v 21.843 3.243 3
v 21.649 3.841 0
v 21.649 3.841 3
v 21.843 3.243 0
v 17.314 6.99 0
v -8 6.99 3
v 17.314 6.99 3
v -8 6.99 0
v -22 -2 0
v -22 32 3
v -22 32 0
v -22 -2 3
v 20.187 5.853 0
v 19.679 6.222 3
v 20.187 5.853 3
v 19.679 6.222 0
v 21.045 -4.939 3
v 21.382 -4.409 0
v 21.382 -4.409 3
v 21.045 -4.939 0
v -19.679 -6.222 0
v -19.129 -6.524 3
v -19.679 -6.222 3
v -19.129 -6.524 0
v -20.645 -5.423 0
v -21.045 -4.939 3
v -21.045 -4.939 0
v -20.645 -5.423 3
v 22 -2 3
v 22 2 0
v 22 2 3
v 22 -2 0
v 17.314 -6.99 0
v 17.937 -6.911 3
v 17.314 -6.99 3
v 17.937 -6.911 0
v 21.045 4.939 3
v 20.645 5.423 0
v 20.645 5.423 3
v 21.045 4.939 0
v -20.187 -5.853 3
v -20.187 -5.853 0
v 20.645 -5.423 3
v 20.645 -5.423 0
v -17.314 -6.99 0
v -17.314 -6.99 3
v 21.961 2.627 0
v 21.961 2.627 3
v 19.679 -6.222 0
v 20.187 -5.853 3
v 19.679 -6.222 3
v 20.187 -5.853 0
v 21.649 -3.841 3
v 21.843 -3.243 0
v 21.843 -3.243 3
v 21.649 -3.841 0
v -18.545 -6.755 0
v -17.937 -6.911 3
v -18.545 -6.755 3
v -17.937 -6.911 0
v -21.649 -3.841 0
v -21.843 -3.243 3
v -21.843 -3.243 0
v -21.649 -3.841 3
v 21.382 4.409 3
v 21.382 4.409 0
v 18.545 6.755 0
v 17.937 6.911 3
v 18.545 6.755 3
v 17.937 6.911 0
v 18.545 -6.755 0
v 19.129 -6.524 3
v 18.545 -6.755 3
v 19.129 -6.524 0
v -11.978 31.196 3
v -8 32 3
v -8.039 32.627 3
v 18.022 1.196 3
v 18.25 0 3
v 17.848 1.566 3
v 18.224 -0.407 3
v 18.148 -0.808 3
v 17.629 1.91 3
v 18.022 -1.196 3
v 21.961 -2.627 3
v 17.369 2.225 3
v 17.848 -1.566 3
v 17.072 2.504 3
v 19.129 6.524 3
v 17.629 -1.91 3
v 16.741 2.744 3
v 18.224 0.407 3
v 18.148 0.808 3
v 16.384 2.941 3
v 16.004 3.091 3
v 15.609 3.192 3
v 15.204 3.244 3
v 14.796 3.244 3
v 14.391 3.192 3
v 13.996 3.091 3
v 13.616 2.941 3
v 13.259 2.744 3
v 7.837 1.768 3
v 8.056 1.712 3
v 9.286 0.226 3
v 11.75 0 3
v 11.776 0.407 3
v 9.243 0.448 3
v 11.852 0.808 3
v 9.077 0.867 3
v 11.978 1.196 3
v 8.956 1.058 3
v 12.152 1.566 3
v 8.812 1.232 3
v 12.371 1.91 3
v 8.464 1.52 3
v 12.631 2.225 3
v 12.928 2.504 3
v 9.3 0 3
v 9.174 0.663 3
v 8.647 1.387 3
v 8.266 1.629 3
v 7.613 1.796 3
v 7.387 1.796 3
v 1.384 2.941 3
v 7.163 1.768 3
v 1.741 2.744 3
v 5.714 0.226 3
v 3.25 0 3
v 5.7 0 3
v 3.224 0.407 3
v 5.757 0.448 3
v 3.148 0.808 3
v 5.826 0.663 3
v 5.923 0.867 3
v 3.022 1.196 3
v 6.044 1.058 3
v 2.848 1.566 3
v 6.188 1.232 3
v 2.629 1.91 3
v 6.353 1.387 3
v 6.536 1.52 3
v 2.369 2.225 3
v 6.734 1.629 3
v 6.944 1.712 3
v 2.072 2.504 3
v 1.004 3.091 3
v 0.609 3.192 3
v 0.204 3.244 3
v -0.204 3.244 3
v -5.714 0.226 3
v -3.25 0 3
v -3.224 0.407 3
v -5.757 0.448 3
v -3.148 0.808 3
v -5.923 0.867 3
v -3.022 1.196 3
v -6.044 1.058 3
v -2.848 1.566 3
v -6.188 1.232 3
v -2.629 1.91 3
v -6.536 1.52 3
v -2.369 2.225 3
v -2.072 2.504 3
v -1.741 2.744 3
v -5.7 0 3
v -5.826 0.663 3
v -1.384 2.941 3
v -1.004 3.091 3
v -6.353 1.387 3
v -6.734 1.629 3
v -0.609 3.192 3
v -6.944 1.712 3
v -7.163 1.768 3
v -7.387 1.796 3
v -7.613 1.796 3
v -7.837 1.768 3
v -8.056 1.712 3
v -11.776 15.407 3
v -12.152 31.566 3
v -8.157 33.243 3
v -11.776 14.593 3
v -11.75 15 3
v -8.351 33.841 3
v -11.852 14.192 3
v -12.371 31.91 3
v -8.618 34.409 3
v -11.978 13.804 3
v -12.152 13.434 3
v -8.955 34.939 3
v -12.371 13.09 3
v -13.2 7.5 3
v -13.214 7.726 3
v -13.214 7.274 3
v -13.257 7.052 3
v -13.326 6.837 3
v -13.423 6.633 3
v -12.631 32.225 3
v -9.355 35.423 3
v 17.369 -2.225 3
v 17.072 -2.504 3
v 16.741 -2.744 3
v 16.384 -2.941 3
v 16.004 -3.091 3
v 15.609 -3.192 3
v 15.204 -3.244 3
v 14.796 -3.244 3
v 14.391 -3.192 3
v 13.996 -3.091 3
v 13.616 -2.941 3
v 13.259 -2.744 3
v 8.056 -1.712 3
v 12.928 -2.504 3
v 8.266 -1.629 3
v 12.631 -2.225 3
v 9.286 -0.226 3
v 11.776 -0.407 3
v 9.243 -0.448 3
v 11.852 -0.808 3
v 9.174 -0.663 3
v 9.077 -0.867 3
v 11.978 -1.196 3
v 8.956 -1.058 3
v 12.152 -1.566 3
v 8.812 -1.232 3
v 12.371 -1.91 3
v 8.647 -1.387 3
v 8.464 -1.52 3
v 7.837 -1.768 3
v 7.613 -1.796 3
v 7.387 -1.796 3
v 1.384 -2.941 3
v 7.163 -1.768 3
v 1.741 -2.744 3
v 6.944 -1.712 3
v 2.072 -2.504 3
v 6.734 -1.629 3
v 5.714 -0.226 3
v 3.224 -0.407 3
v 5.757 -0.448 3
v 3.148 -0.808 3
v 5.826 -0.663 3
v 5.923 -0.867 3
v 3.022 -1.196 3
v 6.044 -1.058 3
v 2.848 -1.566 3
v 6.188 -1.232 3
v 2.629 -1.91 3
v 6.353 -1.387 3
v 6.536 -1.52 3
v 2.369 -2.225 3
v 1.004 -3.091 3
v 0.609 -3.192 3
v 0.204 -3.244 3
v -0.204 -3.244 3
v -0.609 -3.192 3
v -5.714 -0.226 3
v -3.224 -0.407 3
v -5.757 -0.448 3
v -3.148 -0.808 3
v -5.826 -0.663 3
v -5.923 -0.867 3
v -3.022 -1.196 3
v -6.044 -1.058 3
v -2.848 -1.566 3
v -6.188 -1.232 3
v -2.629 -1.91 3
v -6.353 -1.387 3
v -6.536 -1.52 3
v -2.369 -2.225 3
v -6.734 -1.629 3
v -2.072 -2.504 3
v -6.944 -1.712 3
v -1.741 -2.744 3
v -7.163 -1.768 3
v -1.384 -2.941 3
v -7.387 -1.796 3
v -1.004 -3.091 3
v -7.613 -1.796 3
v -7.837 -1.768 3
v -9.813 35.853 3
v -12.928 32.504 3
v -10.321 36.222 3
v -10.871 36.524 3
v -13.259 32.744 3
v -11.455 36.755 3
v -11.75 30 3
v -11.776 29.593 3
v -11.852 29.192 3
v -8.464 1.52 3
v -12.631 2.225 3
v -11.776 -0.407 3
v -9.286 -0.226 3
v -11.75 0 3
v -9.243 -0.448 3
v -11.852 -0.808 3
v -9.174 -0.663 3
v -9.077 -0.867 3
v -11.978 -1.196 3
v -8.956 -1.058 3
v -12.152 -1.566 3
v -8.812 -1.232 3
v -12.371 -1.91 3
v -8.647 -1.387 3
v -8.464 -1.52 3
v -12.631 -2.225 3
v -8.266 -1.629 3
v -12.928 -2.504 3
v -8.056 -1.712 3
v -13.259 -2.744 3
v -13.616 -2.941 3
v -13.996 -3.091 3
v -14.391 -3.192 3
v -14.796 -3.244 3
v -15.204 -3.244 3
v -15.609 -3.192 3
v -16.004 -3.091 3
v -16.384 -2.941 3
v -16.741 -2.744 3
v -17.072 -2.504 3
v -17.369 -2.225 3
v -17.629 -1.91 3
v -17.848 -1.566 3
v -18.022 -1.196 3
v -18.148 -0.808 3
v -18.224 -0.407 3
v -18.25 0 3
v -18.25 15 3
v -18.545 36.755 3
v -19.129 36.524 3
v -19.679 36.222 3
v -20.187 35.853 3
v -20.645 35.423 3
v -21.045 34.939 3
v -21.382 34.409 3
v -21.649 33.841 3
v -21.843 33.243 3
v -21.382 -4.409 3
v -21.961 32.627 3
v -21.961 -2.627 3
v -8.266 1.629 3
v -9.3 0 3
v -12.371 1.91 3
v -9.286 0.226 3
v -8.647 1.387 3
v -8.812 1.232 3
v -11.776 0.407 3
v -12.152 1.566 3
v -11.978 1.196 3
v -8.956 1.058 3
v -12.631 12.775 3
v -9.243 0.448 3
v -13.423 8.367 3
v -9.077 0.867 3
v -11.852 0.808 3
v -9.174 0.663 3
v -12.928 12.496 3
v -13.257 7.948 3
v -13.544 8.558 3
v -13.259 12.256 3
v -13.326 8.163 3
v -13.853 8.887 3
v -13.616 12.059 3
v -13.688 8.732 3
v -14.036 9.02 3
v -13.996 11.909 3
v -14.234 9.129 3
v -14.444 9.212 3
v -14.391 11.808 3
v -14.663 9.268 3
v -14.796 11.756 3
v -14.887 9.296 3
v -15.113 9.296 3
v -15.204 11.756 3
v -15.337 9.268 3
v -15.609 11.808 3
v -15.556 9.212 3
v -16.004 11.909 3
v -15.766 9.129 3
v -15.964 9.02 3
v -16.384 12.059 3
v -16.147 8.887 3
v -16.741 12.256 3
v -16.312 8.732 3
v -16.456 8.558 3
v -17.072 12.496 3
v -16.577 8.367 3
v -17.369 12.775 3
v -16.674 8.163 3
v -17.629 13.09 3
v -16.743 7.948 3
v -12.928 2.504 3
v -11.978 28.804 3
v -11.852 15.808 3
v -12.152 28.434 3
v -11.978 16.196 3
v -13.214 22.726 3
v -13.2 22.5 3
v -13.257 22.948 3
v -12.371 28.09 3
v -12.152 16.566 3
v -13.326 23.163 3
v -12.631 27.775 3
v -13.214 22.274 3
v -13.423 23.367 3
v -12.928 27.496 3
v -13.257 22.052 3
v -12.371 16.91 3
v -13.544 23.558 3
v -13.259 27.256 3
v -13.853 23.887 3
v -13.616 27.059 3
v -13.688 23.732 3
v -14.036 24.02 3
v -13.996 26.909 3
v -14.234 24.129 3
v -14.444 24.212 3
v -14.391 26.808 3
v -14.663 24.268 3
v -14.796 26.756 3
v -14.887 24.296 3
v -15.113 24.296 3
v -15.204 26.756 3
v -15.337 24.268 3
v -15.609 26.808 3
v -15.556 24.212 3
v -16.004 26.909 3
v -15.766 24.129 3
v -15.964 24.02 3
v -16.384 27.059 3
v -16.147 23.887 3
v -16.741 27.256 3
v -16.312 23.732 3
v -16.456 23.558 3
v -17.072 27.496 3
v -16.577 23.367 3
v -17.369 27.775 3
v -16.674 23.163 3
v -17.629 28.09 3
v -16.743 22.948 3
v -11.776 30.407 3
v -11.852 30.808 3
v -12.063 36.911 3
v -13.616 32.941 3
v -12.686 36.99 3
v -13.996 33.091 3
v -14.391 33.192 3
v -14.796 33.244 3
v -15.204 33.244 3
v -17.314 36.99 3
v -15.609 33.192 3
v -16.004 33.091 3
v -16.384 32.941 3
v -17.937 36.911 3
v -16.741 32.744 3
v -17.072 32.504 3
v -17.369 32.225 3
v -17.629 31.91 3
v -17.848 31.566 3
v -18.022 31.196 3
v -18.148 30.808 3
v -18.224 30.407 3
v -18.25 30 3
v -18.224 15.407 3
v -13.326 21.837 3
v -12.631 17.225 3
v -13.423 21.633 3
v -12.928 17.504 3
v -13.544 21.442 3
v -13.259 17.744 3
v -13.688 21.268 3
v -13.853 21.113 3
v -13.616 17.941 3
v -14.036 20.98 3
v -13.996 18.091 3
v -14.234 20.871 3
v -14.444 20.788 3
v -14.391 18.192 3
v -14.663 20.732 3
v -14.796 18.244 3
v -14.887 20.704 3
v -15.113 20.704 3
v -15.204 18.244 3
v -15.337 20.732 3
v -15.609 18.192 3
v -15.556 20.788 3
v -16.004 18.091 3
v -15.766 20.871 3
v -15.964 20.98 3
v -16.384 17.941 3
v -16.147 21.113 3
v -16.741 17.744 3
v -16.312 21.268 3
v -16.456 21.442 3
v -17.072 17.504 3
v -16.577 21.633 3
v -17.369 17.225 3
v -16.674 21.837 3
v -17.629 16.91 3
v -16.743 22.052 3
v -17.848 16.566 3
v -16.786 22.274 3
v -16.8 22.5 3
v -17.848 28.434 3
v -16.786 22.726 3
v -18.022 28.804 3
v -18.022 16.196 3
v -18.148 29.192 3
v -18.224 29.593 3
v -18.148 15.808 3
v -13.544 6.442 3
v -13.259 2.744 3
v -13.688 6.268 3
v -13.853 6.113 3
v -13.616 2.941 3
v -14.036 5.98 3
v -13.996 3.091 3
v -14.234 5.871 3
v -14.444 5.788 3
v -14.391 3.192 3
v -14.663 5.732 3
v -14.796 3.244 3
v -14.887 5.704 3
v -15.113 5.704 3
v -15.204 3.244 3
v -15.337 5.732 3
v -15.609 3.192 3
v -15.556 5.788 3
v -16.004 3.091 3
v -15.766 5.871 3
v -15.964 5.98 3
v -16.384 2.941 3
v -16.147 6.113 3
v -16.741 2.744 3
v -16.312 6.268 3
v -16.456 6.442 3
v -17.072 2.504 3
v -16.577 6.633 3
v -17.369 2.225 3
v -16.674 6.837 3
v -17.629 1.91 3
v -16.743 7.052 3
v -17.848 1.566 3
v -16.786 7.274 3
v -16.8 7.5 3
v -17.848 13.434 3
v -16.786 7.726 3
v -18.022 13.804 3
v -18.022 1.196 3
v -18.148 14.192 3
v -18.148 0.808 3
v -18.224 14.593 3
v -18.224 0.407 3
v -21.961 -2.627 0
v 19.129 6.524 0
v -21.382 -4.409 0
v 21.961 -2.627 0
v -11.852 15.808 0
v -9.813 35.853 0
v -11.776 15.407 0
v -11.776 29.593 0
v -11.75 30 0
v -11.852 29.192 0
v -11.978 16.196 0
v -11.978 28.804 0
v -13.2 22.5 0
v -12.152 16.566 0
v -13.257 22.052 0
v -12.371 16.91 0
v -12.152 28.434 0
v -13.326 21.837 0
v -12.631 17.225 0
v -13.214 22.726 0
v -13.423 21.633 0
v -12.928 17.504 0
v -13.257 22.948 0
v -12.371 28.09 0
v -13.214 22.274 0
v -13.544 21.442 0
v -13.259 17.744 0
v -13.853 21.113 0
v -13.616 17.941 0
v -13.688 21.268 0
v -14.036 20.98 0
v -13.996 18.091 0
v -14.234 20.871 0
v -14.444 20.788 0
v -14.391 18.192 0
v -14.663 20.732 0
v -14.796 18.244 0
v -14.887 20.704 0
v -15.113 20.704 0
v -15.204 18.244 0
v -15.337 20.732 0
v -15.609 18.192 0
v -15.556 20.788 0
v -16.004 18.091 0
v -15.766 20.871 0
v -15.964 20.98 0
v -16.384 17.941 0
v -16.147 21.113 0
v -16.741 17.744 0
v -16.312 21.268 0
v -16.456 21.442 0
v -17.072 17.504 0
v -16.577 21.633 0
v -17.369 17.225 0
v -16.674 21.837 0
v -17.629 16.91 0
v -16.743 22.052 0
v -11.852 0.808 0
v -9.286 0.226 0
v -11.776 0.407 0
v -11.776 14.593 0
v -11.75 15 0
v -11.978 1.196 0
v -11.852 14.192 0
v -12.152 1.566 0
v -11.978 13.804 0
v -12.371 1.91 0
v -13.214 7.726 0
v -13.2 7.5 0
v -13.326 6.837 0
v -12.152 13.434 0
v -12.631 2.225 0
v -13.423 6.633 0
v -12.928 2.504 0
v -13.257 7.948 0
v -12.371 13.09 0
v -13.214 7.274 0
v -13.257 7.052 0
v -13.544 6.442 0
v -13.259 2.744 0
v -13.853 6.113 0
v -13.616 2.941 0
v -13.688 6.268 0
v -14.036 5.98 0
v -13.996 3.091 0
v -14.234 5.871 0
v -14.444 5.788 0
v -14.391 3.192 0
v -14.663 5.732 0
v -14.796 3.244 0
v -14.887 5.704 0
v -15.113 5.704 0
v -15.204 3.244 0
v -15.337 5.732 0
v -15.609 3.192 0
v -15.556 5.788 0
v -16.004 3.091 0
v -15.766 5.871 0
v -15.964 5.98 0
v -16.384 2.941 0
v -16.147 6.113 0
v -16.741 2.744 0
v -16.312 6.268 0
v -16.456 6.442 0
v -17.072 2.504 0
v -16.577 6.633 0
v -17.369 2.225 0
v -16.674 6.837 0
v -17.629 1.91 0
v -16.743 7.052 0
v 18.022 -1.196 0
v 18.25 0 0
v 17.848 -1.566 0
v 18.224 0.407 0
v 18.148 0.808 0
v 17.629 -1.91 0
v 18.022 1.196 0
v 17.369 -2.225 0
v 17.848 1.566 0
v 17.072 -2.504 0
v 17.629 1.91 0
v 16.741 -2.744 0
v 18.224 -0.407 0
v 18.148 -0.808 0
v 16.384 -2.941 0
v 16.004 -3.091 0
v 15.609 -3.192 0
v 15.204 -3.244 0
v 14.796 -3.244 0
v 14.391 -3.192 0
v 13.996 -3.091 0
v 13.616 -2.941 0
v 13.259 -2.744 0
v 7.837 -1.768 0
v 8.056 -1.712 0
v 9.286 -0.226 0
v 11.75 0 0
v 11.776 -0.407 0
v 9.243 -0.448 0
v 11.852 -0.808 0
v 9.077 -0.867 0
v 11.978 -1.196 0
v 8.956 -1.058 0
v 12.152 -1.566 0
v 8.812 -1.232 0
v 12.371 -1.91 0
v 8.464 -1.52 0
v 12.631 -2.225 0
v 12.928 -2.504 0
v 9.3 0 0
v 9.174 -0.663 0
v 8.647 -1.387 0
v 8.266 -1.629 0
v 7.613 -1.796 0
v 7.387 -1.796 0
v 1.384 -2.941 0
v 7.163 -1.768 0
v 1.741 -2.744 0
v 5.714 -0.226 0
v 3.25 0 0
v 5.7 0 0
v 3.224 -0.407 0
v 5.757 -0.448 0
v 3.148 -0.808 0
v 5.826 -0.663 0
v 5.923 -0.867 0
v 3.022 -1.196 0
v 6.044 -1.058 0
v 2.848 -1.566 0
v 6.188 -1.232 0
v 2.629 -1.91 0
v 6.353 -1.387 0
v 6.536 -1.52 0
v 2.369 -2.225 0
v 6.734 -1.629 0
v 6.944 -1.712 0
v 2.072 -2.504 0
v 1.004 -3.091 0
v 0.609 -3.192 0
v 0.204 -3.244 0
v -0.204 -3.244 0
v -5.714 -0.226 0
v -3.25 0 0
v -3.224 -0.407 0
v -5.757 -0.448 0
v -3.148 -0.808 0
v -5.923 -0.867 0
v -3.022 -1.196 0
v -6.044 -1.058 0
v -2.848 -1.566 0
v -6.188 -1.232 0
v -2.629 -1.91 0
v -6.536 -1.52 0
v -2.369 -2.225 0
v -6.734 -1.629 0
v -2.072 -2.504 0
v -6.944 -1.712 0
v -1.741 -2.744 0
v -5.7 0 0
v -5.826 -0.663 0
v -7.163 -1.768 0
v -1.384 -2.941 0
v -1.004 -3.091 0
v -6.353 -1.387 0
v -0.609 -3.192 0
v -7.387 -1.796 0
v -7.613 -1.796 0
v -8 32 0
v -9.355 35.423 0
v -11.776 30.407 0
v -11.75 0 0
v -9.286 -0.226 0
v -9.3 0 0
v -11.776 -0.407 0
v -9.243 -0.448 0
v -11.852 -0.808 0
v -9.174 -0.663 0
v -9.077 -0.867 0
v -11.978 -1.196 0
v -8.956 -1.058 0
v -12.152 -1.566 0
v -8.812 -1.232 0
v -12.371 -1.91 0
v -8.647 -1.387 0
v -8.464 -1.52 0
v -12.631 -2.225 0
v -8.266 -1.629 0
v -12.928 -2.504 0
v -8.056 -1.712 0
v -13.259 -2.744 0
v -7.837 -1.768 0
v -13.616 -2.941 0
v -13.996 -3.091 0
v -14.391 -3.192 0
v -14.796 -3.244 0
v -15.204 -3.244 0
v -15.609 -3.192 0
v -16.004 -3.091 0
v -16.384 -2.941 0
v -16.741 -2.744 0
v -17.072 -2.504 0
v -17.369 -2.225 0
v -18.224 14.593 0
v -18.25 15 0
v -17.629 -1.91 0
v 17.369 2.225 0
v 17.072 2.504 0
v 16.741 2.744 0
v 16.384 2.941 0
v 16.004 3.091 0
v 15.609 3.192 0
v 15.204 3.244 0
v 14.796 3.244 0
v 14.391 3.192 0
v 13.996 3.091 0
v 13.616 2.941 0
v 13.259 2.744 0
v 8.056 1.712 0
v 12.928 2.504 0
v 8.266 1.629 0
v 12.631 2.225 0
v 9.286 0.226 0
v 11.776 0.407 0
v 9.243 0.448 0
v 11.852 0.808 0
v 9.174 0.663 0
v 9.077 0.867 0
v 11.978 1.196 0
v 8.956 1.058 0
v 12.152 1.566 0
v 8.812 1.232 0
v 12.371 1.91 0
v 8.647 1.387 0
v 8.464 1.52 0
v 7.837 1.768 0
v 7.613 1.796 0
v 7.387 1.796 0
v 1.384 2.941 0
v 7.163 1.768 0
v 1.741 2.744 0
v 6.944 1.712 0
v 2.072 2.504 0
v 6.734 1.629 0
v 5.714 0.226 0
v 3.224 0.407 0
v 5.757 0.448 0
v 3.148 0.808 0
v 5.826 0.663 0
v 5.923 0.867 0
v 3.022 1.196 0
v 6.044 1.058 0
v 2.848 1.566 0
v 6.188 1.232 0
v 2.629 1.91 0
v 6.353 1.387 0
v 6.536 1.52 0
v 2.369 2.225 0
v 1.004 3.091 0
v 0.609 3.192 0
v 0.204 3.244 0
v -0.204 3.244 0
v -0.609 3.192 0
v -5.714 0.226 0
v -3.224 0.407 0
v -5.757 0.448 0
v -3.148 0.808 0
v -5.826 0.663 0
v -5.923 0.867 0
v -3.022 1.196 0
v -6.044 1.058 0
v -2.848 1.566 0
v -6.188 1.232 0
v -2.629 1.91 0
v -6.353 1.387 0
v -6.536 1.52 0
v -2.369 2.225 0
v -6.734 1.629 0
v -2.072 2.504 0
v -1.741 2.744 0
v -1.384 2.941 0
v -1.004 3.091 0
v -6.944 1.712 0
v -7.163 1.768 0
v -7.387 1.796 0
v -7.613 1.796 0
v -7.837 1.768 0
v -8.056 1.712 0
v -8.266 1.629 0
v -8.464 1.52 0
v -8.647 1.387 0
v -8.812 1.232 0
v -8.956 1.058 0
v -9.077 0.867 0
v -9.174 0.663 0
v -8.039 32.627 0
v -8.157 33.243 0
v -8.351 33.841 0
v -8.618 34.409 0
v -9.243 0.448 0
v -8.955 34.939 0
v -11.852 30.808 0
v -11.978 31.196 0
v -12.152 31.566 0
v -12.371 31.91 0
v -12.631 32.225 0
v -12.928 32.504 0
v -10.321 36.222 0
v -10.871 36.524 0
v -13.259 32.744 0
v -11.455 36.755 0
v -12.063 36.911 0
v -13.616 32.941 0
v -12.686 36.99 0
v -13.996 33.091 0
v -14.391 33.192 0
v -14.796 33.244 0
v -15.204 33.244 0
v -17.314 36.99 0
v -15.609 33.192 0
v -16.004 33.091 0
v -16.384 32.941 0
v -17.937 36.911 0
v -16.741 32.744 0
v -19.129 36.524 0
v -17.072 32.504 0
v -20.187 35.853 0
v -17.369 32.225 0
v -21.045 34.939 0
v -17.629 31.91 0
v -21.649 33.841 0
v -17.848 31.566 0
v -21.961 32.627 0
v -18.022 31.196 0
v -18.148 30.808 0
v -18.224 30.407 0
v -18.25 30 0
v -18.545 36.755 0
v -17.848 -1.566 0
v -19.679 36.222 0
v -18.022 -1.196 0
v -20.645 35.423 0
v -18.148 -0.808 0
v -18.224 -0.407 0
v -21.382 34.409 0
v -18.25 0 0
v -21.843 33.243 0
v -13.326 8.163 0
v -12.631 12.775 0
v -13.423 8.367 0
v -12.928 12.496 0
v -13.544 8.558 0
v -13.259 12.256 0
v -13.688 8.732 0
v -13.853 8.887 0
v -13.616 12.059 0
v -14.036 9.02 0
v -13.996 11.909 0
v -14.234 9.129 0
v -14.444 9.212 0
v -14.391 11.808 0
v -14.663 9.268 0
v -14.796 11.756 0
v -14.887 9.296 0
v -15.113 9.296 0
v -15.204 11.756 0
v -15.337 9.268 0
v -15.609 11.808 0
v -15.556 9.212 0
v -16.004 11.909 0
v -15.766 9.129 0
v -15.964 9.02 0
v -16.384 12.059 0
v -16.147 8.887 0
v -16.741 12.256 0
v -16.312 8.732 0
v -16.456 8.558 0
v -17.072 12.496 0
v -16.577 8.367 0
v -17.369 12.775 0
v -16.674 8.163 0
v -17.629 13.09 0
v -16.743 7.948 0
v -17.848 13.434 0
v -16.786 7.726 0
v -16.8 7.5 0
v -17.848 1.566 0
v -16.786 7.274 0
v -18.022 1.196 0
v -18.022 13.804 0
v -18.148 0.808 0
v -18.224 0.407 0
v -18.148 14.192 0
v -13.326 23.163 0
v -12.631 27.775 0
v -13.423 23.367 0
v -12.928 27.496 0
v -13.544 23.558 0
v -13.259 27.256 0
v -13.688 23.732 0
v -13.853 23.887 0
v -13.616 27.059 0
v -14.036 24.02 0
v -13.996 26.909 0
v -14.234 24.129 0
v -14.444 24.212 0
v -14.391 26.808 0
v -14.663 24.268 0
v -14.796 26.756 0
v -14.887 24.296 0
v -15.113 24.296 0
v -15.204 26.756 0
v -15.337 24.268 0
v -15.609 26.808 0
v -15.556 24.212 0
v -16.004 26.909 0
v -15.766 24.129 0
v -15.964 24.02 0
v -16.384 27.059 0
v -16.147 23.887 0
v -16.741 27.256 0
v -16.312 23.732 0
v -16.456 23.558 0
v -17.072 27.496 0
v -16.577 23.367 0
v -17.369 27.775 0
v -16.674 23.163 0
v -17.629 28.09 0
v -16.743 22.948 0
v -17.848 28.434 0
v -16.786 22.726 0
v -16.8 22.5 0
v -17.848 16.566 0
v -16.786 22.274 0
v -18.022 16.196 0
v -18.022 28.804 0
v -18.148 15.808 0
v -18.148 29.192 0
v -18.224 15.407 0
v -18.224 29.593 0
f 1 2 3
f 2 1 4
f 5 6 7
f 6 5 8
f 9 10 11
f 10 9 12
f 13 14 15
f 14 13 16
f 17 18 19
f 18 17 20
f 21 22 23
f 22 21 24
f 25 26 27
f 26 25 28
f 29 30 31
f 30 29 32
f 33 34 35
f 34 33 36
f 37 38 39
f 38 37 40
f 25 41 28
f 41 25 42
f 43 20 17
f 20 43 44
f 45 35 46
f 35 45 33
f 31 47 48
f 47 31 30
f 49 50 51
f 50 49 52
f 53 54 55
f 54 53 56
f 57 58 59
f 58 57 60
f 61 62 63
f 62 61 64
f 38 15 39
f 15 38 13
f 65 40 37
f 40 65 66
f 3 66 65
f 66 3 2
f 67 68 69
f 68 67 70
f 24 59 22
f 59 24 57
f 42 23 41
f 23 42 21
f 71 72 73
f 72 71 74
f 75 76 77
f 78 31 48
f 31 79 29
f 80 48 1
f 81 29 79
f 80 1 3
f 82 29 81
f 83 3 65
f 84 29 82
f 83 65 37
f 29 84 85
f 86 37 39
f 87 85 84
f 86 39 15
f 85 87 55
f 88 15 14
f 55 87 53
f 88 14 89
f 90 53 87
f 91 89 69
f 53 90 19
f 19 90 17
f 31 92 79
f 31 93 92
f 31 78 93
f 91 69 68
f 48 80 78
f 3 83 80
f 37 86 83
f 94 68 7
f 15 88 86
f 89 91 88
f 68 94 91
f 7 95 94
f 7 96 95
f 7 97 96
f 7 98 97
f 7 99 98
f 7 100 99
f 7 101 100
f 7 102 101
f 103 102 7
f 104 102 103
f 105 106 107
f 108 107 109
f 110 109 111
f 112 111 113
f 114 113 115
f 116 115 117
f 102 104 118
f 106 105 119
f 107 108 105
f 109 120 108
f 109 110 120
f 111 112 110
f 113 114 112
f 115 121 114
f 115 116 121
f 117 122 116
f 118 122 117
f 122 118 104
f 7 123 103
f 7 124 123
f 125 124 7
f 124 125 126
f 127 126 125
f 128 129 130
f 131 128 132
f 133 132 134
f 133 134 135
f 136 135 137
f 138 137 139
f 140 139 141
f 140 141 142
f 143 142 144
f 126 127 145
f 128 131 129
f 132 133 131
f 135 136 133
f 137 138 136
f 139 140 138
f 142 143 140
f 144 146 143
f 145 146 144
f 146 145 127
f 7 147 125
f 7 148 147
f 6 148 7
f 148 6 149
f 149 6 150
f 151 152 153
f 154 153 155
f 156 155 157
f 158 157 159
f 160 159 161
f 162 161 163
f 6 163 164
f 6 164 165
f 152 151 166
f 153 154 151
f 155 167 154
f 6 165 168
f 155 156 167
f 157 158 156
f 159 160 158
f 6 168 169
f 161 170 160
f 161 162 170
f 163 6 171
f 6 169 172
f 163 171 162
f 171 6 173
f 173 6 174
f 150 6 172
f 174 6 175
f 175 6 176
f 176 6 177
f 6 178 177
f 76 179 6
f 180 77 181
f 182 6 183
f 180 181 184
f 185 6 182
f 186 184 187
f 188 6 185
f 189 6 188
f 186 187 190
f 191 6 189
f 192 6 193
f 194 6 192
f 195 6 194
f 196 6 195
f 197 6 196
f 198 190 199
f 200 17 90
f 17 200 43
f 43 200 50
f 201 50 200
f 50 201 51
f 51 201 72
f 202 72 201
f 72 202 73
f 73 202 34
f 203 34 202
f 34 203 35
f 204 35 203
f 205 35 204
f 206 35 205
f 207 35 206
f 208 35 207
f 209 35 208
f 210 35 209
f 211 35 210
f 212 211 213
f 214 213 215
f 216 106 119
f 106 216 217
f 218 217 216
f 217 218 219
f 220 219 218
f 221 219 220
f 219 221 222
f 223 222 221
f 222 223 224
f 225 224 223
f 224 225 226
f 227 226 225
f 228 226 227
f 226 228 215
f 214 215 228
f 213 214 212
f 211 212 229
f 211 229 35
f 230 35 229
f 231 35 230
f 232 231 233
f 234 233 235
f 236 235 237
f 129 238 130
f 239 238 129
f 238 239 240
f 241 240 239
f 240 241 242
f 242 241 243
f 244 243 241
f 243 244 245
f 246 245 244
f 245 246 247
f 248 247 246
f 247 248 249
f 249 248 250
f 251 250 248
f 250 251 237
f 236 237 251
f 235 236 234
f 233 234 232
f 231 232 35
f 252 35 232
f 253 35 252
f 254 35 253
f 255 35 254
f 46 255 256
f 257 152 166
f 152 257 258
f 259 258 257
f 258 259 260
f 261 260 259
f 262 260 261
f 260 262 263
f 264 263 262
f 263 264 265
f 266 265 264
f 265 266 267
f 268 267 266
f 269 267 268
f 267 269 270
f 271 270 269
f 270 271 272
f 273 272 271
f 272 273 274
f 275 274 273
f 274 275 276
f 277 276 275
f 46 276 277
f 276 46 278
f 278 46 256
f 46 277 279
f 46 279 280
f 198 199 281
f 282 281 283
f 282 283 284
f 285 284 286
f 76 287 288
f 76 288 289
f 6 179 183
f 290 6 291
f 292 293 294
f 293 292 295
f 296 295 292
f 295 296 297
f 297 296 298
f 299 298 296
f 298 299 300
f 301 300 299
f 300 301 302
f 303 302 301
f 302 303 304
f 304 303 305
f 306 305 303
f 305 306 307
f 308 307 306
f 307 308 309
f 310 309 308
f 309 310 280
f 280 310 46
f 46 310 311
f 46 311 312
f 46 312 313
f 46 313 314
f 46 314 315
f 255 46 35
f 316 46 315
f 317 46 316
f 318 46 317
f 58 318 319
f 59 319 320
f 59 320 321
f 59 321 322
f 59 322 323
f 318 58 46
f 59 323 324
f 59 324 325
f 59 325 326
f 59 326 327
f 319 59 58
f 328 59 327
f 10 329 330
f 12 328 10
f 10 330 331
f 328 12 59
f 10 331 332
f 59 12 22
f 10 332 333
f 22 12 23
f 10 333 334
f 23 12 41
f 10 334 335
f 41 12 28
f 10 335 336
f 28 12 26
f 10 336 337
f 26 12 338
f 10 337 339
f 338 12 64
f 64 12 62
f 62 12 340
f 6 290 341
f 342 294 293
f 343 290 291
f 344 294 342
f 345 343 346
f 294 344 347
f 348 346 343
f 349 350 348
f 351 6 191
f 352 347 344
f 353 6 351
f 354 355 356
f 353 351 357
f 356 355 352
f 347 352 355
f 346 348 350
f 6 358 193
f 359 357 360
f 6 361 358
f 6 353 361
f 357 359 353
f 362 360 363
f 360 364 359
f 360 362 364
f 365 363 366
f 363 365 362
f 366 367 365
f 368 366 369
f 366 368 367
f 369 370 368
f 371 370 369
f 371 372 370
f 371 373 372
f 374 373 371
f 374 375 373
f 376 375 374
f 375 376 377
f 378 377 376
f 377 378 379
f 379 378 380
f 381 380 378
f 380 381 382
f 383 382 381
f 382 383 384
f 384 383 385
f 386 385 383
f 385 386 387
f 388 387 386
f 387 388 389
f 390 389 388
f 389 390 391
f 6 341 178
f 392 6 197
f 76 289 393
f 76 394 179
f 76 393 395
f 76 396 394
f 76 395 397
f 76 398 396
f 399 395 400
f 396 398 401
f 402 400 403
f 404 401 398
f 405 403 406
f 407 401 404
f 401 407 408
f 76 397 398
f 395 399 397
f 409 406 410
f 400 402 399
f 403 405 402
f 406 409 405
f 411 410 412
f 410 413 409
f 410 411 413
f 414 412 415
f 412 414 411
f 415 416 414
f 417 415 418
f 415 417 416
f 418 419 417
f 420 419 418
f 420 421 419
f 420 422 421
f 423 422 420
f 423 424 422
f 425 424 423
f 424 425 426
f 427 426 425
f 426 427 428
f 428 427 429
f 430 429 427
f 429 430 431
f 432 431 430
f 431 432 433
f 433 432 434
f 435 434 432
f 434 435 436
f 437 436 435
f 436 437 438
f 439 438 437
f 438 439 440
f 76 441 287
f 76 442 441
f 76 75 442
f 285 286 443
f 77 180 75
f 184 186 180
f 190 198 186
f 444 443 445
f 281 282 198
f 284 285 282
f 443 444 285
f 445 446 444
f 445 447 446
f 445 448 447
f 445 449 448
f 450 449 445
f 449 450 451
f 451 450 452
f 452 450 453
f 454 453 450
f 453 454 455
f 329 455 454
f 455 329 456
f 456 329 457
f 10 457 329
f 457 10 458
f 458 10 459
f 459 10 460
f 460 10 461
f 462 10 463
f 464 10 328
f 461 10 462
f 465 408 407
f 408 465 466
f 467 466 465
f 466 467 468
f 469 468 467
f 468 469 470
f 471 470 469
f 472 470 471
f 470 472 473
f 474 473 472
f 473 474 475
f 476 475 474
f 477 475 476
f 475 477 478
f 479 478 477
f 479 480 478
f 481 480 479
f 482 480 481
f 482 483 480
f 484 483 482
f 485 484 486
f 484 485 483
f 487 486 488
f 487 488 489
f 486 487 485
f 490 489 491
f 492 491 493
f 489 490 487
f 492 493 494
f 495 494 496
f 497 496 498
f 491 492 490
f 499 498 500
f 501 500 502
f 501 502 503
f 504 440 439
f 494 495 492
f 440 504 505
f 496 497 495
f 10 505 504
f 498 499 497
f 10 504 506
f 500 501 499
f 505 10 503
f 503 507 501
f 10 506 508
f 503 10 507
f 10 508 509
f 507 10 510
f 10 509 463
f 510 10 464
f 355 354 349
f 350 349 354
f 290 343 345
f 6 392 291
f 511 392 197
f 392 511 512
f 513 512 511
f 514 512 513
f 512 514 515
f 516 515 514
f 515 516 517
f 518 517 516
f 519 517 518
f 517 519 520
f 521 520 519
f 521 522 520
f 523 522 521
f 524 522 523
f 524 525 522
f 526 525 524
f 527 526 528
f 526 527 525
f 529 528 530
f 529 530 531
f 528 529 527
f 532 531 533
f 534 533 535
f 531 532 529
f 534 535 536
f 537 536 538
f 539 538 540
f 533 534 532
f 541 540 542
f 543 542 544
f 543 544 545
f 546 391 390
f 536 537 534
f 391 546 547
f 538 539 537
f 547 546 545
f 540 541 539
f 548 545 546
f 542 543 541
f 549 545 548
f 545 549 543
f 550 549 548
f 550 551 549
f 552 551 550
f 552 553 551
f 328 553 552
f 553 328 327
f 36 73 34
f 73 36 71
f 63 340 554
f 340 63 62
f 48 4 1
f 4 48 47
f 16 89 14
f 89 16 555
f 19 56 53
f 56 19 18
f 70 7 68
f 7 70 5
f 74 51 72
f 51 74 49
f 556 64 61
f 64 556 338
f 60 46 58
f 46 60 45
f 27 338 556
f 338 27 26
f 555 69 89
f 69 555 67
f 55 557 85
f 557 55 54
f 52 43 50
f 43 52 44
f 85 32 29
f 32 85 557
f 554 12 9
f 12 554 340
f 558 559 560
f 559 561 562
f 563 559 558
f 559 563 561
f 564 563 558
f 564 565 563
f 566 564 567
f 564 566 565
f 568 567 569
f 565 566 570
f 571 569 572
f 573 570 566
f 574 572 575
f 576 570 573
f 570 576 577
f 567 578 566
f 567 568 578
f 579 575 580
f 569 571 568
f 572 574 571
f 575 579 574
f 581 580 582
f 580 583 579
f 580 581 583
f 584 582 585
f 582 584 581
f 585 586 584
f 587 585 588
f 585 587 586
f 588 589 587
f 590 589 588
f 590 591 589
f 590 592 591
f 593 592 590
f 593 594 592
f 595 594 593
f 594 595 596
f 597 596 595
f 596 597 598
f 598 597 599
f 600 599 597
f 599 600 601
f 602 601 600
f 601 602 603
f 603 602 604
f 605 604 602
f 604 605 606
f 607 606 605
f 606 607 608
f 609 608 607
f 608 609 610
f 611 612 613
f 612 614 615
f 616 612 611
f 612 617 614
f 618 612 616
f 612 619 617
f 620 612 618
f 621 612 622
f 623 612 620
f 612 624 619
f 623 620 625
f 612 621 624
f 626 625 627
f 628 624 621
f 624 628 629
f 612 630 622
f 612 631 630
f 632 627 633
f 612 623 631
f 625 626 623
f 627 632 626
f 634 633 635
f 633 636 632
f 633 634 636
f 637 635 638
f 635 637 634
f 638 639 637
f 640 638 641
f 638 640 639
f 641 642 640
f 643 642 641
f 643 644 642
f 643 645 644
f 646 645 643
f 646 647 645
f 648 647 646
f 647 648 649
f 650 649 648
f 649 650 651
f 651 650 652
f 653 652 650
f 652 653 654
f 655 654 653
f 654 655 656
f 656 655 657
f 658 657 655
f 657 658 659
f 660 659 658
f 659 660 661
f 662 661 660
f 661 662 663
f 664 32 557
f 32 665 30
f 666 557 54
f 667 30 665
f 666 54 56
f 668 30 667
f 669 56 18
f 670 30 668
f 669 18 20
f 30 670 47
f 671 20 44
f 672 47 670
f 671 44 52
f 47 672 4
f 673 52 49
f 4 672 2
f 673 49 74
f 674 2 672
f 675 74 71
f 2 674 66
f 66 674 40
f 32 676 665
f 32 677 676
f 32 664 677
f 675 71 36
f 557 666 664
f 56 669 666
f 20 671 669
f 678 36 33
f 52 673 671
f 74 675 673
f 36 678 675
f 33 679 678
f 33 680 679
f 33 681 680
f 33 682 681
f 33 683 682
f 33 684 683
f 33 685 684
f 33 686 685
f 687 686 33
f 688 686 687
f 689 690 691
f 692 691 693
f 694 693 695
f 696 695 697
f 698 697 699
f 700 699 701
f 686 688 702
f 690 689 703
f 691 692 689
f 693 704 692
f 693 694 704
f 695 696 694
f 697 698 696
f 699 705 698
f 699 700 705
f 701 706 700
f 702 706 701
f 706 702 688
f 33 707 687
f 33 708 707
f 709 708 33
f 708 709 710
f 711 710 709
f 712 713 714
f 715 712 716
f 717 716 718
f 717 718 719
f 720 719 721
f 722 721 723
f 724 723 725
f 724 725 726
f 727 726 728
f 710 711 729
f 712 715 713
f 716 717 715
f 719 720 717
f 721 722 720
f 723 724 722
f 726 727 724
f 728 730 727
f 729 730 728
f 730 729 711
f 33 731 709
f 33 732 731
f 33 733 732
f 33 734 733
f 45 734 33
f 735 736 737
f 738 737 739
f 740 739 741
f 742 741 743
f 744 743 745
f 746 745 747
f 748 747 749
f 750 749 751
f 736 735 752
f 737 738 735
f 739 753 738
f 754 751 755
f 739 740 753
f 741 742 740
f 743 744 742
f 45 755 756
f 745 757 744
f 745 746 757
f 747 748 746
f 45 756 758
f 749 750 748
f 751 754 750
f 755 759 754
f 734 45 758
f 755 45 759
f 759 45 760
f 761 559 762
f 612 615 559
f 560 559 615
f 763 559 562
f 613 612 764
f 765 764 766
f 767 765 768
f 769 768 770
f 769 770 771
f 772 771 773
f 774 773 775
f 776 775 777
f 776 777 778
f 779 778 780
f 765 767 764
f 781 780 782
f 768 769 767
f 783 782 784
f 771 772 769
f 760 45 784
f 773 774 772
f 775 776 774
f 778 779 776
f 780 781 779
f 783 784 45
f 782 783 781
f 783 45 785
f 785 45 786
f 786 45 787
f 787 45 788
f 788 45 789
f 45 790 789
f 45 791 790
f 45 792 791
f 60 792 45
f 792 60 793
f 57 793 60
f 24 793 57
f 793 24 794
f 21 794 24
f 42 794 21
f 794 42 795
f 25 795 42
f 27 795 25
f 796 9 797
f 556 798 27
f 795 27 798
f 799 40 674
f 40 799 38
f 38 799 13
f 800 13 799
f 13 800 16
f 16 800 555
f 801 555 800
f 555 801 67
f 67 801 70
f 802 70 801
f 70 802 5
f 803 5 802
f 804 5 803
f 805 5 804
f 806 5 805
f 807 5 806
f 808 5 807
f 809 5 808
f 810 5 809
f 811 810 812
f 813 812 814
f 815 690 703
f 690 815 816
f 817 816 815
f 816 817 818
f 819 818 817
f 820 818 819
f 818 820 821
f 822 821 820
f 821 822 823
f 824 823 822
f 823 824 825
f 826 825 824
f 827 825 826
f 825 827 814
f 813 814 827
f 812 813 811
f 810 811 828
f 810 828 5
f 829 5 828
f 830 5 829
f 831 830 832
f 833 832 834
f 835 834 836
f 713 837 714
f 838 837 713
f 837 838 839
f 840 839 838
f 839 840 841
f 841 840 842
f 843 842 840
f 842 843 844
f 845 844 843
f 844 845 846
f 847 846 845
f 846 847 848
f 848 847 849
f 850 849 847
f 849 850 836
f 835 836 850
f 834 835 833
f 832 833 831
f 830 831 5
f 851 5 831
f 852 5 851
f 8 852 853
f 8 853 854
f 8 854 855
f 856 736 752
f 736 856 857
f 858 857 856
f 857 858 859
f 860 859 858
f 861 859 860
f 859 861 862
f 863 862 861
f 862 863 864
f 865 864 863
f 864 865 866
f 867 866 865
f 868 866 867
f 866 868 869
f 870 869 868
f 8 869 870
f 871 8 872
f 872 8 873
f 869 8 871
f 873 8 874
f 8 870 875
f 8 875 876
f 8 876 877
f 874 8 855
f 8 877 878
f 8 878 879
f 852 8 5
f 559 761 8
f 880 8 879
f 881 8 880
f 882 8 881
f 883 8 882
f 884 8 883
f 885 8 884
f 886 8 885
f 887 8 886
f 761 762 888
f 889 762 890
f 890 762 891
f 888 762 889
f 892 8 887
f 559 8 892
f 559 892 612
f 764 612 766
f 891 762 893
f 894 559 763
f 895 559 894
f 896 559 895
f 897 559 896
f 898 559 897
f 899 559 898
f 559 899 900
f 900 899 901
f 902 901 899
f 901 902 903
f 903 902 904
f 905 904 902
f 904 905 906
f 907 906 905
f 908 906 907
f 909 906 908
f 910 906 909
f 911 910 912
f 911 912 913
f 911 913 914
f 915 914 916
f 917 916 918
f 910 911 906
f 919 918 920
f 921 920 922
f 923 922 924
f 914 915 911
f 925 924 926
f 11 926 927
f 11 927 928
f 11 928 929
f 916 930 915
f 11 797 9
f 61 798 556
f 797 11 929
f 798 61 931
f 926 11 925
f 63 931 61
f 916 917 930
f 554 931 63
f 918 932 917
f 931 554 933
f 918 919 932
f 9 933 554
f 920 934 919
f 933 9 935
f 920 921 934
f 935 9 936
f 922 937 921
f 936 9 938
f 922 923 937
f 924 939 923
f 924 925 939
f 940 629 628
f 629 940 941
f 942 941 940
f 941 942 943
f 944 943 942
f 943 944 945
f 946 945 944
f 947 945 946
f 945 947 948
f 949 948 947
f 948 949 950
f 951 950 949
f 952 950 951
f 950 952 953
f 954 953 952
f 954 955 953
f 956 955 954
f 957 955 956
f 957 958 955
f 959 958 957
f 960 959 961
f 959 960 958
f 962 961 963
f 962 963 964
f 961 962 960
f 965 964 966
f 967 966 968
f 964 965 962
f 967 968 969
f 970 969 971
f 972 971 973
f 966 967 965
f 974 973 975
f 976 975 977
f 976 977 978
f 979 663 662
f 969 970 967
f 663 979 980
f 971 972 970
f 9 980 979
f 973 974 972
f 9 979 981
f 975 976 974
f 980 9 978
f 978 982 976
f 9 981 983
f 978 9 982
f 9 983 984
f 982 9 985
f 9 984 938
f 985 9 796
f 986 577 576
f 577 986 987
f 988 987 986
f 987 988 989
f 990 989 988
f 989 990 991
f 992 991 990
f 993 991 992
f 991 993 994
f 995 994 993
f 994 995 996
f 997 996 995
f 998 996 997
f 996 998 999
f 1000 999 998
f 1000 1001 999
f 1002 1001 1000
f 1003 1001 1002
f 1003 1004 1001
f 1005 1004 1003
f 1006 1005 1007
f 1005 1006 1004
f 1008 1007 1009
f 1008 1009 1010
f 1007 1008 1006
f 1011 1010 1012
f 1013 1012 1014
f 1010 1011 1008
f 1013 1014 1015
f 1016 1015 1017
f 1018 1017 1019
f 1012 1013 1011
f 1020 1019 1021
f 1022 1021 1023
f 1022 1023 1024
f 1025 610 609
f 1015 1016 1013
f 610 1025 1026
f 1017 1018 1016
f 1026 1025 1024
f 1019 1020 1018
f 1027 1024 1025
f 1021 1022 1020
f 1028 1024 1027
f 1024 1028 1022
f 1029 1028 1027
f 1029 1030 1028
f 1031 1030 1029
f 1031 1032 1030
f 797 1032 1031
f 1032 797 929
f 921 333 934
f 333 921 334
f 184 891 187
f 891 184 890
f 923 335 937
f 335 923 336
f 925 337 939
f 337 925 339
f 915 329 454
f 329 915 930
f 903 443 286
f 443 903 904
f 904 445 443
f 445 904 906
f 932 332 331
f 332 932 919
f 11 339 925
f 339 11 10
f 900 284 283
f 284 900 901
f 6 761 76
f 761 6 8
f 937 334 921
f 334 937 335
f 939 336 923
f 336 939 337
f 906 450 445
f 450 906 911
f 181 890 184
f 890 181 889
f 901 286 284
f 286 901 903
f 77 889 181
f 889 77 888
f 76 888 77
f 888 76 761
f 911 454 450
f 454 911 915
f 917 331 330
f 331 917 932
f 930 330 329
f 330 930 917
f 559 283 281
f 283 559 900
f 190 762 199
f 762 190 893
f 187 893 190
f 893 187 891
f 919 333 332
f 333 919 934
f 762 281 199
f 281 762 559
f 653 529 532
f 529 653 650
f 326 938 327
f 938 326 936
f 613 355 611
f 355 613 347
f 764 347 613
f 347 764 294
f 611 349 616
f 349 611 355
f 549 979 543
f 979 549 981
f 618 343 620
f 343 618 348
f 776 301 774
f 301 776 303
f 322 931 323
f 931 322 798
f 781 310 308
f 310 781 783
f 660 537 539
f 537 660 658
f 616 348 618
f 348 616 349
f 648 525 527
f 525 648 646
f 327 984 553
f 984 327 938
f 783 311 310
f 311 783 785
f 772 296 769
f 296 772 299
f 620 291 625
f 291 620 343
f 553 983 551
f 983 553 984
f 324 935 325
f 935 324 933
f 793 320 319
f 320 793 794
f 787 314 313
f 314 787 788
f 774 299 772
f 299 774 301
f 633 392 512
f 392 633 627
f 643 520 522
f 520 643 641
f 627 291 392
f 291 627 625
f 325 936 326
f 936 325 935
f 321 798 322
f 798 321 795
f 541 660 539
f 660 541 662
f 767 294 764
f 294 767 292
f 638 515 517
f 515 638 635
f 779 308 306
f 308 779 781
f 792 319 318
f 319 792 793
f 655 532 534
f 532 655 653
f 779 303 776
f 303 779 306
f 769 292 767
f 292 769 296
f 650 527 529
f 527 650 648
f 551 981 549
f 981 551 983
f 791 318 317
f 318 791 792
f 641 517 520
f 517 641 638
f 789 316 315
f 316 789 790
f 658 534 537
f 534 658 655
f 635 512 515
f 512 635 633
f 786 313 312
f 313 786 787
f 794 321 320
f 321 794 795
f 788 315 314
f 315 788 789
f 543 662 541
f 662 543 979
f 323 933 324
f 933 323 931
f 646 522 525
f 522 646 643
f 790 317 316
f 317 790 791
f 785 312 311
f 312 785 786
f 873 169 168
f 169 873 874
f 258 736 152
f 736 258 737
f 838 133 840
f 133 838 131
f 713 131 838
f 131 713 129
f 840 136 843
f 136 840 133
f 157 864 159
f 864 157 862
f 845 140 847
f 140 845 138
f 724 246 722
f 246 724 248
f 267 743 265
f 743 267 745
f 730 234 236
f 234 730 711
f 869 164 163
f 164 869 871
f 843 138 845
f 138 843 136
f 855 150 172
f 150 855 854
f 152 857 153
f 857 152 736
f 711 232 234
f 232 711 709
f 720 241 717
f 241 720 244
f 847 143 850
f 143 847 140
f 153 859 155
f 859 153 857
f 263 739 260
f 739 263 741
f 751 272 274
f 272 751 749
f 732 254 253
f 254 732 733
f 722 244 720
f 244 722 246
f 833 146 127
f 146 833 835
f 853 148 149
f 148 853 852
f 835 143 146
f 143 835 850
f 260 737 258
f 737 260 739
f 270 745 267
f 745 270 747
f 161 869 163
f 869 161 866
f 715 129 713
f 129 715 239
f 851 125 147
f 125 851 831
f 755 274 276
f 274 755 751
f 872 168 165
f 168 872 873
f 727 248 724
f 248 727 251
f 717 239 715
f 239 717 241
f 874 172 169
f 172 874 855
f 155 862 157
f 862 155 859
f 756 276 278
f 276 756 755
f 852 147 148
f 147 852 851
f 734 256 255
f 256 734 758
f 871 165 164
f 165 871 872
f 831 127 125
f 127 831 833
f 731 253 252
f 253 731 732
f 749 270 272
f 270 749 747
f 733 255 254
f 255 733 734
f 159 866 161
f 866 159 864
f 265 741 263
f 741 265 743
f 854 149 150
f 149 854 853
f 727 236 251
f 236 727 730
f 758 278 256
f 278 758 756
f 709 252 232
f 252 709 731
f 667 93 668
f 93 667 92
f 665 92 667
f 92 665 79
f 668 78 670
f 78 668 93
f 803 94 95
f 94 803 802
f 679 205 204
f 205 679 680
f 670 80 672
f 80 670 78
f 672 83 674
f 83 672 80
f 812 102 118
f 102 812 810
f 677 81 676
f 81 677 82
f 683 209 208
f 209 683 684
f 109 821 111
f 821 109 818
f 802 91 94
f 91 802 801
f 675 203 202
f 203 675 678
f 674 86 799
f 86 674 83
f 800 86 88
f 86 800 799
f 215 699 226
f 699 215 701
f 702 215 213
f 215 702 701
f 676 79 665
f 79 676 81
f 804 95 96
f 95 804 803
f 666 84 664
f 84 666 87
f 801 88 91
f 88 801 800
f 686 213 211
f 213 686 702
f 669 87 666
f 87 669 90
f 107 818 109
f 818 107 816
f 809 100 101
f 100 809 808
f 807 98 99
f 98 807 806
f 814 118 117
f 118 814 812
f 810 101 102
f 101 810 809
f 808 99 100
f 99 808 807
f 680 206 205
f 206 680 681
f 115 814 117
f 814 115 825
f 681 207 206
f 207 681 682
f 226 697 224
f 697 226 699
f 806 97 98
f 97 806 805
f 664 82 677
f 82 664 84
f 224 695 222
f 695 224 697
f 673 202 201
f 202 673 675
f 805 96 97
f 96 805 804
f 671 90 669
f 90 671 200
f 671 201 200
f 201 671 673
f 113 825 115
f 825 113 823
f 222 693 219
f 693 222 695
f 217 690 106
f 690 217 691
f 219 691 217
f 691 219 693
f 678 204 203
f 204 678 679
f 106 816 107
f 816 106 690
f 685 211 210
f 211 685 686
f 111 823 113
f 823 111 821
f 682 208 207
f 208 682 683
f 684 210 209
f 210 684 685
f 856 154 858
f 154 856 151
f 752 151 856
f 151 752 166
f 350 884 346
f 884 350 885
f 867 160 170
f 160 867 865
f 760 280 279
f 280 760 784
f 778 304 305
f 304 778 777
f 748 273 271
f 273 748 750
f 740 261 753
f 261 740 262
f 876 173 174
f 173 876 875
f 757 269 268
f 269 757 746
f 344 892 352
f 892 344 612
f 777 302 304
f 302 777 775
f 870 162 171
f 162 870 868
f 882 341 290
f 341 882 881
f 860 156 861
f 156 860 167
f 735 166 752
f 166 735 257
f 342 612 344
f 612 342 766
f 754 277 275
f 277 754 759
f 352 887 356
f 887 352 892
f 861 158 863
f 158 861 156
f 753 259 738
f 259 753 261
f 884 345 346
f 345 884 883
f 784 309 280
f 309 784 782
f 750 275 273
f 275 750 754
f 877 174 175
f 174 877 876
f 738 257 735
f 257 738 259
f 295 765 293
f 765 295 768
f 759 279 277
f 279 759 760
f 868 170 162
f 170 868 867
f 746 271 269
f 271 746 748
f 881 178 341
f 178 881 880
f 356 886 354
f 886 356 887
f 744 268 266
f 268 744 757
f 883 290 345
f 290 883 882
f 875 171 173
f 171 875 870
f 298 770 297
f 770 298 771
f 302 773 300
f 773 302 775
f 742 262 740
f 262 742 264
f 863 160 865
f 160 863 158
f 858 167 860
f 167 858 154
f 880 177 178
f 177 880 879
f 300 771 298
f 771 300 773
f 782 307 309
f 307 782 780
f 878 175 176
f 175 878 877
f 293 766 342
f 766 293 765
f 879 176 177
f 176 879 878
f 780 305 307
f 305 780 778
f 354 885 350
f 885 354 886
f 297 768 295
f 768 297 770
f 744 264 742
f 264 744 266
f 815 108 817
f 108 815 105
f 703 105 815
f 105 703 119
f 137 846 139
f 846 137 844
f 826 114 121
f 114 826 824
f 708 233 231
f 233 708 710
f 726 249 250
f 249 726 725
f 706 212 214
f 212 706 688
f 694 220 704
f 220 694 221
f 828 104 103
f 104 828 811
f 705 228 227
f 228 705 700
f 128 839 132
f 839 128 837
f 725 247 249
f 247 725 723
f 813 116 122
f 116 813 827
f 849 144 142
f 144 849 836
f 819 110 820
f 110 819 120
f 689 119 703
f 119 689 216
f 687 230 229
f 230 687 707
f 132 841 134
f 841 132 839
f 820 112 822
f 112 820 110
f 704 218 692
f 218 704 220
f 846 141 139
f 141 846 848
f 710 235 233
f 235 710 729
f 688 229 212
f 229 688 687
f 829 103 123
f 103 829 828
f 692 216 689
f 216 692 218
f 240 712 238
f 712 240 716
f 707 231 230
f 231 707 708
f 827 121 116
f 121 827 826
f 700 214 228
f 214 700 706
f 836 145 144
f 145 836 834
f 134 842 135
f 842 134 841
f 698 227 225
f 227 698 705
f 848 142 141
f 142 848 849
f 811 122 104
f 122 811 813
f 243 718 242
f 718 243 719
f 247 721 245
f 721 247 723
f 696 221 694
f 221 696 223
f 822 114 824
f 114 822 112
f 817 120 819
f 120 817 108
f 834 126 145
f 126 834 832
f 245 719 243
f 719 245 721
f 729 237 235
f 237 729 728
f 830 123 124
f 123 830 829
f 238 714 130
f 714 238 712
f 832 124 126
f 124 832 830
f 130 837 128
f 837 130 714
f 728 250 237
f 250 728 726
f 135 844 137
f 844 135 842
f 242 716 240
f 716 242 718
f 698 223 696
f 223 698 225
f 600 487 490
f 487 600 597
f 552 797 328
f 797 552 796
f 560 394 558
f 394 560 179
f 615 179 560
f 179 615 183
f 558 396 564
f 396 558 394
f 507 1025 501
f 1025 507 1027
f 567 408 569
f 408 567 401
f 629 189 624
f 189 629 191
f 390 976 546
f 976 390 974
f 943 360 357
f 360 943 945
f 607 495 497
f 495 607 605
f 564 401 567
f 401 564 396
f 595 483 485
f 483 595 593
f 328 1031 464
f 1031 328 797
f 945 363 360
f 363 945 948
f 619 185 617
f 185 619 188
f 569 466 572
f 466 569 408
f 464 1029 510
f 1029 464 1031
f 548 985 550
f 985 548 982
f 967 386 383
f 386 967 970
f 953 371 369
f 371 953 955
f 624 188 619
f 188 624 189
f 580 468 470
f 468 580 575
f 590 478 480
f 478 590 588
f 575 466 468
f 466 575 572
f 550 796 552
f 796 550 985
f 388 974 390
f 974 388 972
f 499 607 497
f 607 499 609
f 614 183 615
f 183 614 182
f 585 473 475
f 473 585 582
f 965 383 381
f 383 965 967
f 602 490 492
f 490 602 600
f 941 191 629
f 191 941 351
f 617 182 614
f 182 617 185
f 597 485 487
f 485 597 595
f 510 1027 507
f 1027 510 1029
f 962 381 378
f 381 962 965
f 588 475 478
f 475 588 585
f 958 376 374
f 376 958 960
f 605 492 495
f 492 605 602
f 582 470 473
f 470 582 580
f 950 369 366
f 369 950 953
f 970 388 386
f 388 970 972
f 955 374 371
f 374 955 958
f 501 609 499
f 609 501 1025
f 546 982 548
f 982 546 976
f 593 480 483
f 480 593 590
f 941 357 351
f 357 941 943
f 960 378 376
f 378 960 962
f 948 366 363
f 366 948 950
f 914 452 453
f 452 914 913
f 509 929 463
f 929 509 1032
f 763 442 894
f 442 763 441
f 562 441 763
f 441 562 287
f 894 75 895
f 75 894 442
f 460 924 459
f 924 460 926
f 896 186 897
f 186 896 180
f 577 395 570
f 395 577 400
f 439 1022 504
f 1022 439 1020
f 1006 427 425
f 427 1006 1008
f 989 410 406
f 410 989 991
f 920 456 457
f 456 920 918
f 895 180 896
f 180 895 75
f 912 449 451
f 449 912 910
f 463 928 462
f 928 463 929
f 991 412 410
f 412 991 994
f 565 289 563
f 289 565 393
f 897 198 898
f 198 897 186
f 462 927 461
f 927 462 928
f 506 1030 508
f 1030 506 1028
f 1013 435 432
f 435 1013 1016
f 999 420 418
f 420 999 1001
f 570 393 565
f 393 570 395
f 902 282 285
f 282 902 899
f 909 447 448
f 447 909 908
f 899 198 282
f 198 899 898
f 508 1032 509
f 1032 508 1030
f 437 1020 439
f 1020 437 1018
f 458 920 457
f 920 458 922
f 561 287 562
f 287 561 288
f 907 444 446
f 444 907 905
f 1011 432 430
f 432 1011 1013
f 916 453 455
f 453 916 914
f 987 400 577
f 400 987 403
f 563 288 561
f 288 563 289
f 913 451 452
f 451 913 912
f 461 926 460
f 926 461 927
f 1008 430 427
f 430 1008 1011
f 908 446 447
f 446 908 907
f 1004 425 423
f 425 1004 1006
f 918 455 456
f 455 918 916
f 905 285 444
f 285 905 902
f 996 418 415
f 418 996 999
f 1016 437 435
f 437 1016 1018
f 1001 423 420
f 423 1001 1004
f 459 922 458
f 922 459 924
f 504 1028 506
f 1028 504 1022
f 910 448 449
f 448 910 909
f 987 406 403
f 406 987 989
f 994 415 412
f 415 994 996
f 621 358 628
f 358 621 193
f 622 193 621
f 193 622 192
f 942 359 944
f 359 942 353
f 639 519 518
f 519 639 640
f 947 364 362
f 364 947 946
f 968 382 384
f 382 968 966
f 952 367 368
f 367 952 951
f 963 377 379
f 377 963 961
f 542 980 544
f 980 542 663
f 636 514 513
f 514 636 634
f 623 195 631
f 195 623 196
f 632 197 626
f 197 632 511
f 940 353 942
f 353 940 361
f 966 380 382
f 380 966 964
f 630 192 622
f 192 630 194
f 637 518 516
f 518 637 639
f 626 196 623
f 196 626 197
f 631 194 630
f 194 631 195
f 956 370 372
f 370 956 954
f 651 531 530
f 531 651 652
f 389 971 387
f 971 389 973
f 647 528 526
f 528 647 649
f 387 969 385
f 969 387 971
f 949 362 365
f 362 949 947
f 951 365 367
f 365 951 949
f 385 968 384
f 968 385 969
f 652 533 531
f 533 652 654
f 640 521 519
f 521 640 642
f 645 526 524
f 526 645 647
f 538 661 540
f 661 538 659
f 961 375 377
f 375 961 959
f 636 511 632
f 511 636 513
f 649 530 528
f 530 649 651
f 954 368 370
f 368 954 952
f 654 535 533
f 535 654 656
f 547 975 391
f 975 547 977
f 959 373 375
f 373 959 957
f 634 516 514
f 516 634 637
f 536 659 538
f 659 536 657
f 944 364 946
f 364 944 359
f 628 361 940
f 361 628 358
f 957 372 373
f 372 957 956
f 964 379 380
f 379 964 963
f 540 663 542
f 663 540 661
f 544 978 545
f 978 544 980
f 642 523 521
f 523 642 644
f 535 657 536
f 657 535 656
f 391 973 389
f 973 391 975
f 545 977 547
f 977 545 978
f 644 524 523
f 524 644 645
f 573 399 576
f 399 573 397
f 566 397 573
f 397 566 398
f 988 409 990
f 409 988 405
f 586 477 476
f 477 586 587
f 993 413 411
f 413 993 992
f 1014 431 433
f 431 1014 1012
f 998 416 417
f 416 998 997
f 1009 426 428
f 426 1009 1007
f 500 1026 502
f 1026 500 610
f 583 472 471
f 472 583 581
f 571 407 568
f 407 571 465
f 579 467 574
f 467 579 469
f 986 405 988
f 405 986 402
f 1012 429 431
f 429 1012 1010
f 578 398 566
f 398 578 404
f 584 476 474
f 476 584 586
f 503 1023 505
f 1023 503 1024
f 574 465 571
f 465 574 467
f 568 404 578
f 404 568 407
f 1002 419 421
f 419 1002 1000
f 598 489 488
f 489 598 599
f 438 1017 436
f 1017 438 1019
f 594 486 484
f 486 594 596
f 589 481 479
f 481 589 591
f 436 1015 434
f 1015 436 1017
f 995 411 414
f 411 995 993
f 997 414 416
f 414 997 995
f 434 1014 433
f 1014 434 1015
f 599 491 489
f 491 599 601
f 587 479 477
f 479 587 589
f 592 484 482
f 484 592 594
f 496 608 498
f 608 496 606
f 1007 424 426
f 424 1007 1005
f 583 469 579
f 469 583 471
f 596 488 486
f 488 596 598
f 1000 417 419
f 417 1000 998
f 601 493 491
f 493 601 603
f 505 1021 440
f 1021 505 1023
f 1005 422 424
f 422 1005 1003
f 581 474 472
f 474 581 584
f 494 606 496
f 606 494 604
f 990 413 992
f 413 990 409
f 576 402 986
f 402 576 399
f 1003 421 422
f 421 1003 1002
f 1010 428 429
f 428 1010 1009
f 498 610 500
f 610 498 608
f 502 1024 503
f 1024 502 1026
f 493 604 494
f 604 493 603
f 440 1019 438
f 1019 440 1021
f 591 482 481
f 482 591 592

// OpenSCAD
$fn = 50;


difference() {
	union() {
		*color(alpha = 1.0000000000, c = "gray") {
			translate(v = [0, 7, 0]) {
				linear_extrude(height = 1) {
					text(font = "Arial:style=Bold", halign = "center", size = 4.5000000000, text = "COMMENT plate main", valign = "center");
				}
			}
		}
		hull() {
			translate(v = [-17.0000000000, 2.0000000000, 0]) {
				cylinder(h = 3, r = 5);
			}
			translate(v = [17.0000000000, 2.0000000000, 0]) {
				cylinder(h = 3, r = 5);
			}
			translate(v = [-17.0000000000, -2.0000000000, 0]) {
				cylinder(h = 3, r = 5);
			}
			translate(v = [17.0000000000, -2.0000000000, 0]) {
				cylinder(h = 3, r = 5);
			}
		}
		*color(alpha = 1.0000000000, c = "gray") {
			translate(v = [0, 7, 0]) {
				linear_extrude(height = 1) {
					text(font = "Arial:style=Bold", halign = "center", size = 4.5000000000, text = "COMMENT plate main", valign = "center");
				}
			}
		}
		translate(v = [-15.0000000000, 15.0000000000, 0]) {
			hull() {
				translate(v = [-2.0000000000, 17.0000000000, 0]) {
					cylinder(h = 3, r = 5);
				}
				translate(v = [2.0000000000, 17.0000000000, 0]) {
					cylinder(h = 3, r = 5);
				}
				translate(v = [-2.0000000000, -17.0000000000, 0]) {
					cylinder(h = 3, r = 5);
				}
				translate(v = [2.0000000000, -17.0000000000, 0]) {
					cylinder(h = 3, r = 5);
				}
			}
		}
	}
	union() {
		*color(alpha = 1.0000000000, c = "gray") {
			translate(v = [0, 7, 0]) {
				linear_extrude(height = 1) {
					text(font = "Arial:style=Bold", halign = "center", size = 4.5000000000, text = "COMMENT holes main", valign = "center");
				}
			}
		}
		translate(v = [-15.0000000000, 0.0000000000, 0]) {
			translate(v = [0, 0, -100]) {
				cylinder(h = 200, r = 3.2500000000);
			}
		}
		translate(v = [0, 0, -100]) {
			cylinder(h = 200, r = 3.2500000000);
		}
		translate(v = [15.0000000000, 0.0000000000, 0]) {
			translate(v = [0, 0, -100]) {
				cylinder(h = 200, r = 3.2500000000);
			}
		}
		translate(v = [-15.0000000000, 0.0000000000, 0]) {
			translate(v = [0, 0, -100]) {
				cylinder(h = 200, r = 1.8000000000);
			}
		}
		translate(v = [-7.5000000000, 0.0000000000, 0]) {
			translate(v = [0, 0, -100]) {
				cylinder(h = 200, r = 1.8000000000);
			}
		}
		translate(v = [0, 0, -100]) {
			cylinder(h = 200, r = 1.8000000000);
		}
		translate(v = [7.5000000000, 0.0000000000, 0]) {
			translate(v = [0, 0, -100]) {
				cylinder(h = 200, r = 1.8000000000);
			}
		}
		translate(v = [15.0000000000, 0.0000000000, 0]) {
			translate(v = [0, 0, -100]) {
				cylinder(h = 200, r = 1.8000000000);
			}
		}
		*color(alpha = 1.0000000000, c = "gray") {
			translate(v = [0, 7, 0]) {
				linear_extrude(height = 1) {
					text(font = "Arial:style=Bold", halign = "center", size = 4.5000000000, text = "COMMENT holes main", valign = "center");
				}
			}
		}
		translate(v = [-15.0000000000, 0.0000000000, 0]) {
			translate(v = [0, 0, -100]) {
				cylinder(h = 200, r = 3.2500000000);
			}
		}
		translate(v = [-15.0000000000, 15.0000000000, 0]) {
			translate(v = [0, 0, -100]) {
				cylinder(h = 200, r = 3.2500000000);
			}
		}
		translate(v = [-15.0000000000, 30.0000000000, 0]) {
			translate(v = [0, 0, -100]) {
				cylinder(h = 200, r = 3.2500000000);
			}
		}
		translate(v = [-15.0000000000, 0.0000000000, 0]) {
			translate(v = [0, 0, -100]) {
				cylinder(h = 200, r = 1.8000000000);
			}
		}
		translate(v = [-15.0000000000, 7.5000000000, 0]) {
			translate(v = [0, 0, -100]) {
				cylinder(h = 200, r = 1.8000000000);
			}
		}
		translate(v = [-15.0000000000, 15.0000000000, 0]) {
			translate(v = [0, 0, -100]) {
				cylinder(h = 200, r = 1.8000000000);
			}
		}
		translate(v = [-15.0000000000, 22.5000000000, 0]) {
			translate(v = [0, 0, -100]) {
				cylinder(h = 200, r = 1.8000000000);
			}
		}
		translate(v = [-15.0000000000, 30.0000000000, 0]) {
			translate(v = [0, 0, -100]) {
				cylinder(h = 200, r = 1.8000000000);
			}
		}
	}
}
